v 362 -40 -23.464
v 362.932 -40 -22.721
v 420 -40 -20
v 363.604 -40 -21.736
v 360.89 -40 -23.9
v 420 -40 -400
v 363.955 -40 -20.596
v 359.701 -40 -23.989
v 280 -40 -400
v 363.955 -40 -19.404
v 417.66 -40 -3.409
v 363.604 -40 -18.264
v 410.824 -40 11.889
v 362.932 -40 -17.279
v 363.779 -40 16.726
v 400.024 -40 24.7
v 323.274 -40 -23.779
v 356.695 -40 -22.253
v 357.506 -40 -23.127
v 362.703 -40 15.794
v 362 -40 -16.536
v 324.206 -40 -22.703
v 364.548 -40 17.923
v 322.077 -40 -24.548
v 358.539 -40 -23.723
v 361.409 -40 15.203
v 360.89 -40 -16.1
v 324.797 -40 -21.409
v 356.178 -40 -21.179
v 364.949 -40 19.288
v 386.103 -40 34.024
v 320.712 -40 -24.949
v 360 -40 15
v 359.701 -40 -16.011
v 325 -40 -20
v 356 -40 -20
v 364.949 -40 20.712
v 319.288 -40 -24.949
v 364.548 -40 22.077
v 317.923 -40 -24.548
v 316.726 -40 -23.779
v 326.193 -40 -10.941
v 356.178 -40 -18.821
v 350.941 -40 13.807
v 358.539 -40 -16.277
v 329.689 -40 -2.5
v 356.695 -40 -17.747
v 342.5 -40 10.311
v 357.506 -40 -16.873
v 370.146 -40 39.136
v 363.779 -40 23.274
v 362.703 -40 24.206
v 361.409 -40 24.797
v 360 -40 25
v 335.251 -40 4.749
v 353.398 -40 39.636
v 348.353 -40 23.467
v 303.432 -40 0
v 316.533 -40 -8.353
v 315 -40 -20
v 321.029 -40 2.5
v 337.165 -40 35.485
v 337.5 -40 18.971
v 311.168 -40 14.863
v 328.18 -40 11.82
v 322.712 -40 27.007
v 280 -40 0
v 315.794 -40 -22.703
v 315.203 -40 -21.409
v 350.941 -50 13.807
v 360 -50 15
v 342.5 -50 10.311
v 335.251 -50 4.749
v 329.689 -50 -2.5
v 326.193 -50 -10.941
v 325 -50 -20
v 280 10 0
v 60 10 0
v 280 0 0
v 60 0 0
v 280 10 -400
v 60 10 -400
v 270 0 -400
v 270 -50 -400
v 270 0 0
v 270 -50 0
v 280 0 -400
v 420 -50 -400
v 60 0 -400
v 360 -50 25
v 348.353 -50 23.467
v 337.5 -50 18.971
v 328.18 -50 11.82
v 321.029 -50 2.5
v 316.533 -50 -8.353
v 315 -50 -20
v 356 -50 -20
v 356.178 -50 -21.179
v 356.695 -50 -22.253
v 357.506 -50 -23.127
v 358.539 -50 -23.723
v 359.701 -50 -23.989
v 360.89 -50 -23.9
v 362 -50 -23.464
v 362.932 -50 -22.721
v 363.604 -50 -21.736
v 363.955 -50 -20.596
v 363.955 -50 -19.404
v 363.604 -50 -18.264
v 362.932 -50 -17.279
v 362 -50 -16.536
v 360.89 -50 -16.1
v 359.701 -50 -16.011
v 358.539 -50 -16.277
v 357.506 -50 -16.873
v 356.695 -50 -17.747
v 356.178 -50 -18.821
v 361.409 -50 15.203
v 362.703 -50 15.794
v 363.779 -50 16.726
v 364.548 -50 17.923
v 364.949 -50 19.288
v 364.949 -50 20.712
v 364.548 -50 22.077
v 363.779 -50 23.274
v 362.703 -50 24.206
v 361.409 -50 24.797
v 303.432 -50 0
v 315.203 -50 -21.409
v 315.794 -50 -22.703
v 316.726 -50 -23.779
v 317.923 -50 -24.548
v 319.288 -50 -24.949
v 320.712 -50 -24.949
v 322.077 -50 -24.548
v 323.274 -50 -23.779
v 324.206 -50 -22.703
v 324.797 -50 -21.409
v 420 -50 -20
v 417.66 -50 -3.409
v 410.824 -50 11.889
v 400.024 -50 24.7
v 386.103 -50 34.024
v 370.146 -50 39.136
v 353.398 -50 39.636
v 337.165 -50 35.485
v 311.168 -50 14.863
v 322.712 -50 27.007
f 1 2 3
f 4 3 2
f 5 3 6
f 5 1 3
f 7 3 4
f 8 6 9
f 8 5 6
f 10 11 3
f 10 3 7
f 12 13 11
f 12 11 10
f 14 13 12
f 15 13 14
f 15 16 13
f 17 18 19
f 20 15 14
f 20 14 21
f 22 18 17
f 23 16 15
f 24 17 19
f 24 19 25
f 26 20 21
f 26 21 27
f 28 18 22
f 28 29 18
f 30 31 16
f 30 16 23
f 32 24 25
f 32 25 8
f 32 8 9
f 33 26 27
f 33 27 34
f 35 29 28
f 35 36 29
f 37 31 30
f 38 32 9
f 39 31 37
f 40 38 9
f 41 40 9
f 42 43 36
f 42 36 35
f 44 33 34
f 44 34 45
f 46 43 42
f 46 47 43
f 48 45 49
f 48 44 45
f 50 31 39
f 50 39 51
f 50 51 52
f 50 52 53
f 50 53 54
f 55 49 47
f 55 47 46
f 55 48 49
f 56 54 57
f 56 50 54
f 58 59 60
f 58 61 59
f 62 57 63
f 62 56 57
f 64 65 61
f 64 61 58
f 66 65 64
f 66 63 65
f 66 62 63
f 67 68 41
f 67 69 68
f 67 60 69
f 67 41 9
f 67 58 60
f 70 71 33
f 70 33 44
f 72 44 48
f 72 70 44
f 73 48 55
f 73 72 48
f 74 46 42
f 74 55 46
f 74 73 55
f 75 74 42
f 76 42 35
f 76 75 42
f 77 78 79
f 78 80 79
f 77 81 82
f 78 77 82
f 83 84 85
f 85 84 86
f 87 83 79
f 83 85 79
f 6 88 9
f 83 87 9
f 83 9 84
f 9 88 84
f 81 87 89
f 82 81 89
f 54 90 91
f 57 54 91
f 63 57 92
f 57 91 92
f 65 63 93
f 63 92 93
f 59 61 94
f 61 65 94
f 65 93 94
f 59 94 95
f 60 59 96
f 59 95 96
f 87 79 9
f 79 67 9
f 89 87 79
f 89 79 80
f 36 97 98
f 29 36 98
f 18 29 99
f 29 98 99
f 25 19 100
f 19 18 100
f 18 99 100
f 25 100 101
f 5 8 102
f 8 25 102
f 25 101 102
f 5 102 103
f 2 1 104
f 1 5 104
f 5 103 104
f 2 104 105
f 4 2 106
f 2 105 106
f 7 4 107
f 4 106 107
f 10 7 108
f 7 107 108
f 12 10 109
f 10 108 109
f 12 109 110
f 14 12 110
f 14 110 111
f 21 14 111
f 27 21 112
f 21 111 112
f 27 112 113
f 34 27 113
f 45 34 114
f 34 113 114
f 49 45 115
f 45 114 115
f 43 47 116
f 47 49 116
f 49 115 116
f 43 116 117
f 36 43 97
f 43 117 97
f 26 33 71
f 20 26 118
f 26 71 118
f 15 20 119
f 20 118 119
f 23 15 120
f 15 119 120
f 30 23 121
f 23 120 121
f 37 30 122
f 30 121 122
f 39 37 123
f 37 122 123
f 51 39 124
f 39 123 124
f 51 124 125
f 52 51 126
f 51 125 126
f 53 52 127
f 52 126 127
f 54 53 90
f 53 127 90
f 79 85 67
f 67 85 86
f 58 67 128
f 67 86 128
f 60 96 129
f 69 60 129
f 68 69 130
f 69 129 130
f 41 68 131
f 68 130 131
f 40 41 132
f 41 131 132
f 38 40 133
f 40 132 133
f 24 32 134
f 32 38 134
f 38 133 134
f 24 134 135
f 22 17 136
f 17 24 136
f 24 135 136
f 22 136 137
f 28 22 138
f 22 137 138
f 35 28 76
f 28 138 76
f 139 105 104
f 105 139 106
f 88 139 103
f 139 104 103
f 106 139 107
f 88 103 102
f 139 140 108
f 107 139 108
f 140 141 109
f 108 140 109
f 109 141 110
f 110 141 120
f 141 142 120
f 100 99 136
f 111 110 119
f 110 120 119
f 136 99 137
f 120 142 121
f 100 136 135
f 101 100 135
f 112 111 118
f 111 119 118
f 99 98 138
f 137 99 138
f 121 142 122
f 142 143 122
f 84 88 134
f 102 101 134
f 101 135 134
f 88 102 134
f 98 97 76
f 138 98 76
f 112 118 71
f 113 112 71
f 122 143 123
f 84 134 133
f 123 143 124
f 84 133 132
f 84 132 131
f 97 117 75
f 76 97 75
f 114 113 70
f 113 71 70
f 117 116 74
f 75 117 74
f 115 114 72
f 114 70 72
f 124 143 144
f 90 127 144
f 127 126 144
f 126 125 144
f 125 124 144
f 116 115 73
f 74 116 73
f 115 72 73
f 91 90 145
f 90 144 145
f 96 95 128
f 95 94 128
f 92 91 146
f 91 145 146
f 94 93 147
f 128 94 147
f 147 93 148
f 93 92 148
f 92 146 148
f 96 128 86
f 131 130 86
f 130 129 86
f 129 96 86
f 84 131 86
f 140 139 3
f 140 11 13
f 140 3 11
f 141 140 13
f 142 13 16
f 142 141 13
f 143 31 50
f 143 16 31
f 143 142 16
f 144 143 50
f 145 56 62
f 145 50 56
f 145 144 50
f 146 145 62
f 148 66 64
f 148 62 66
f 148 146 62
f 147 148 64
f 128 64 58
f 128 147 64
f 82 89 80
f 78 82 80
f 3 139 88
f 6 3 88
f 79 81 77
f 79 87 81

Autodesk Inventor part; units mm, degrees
ref_plane "YZ Plane" through (0, 0, 0) normal (1, 0, 0) x (0, 1, 0)
ref_plane "XZ Plane" through (0, 0, 0) normal (0, 1, 0) x (-1, 0, 0)
ref_plane "XY Plane" through (0, 0, 0) normal (0, 0, 1) x (1, 0, 0)
sketch "Boceto2" plane through (0, 0, 0) normal (0, 1, 0) x (-1, 0, 0)
  line L0 (-420, -20) -> (-420, -400)
  line L1 (-420, -400) -> (-60, -400)
  line L2 (-60, -400) -> (-60, 0)
  line L3 (-60, 0) -> (-303.4315, 0)
  arc A0 (-303.4315, 0) -> (-420, -20) centre (-360, -20) ccw
  circle A1 centre (-360, -20) radius 4
  circle A2 centre (-360, 20) radius 5
  circle A3 centre (-320, -20) radius 5
  arc A4 (-325, -20) -> (-360, 15) centre (-360, -20) ccw
  arc A5 (-315, -20) -> (-360, 25) centre (-360, -20) ccw
  dimension "d15" = 360
  dimension "d18" = 60
  dimension "d19" = 8
  dimension "d20" = 10
  dimension "d31" = 60
  dimension "d32" = 40
  dimension "d33" = 60
  dimension "d34" = 400
  dimension "d35" = 10
  dimension "d38" = 40
extrude "Extrusión1" add sketch "Boceto2" along normal blind 10 contours A0 L3 L2 L1 L0 | A2 A5 A3 A4 | A3
extrude "Extrusión2" cut sketch "Boceto2" along normal blind 10 contours A2 A5 A3 A4 | A3
ref_plane "Plano de trabajo1" through (280, 0, -20) normal (1, 0, 0) x (0, 0, -1)
split body "Dividir1" result two bodies by plane through (280, 0, -20) normal (1, 0, 0) first body at (353.1726, 0.5, -274.6569)
move or copy body "Desplazar cuerpo1" bodies to move or copy 2 copy no translate (0, -50, 0)
sketch "Boceto3" plane through (420, -50, -400) normal (0, -1, 0) x (1, 0, 0)
  line L0 (-140, 400) -> (-140, 400)
  line L1 (-140, 0) -> (-140, 0)
  line L2 (-140, 0) -> (-150, 0)
  line L3 (-150, 0) -> (-150, 400)
  line L4 (-150, 400) -> (-140, 400)
  line L5 (-140, 400) -> (-140, 0)
  point P0 (-420, 400)
  dimension "d47" = 10
  dimension "d48" = 400
extrude "Extrusión4" add sketch "Boceto3" against normal blind 50 bodies 2
properties part number "Base" material "Acero, fundido"
